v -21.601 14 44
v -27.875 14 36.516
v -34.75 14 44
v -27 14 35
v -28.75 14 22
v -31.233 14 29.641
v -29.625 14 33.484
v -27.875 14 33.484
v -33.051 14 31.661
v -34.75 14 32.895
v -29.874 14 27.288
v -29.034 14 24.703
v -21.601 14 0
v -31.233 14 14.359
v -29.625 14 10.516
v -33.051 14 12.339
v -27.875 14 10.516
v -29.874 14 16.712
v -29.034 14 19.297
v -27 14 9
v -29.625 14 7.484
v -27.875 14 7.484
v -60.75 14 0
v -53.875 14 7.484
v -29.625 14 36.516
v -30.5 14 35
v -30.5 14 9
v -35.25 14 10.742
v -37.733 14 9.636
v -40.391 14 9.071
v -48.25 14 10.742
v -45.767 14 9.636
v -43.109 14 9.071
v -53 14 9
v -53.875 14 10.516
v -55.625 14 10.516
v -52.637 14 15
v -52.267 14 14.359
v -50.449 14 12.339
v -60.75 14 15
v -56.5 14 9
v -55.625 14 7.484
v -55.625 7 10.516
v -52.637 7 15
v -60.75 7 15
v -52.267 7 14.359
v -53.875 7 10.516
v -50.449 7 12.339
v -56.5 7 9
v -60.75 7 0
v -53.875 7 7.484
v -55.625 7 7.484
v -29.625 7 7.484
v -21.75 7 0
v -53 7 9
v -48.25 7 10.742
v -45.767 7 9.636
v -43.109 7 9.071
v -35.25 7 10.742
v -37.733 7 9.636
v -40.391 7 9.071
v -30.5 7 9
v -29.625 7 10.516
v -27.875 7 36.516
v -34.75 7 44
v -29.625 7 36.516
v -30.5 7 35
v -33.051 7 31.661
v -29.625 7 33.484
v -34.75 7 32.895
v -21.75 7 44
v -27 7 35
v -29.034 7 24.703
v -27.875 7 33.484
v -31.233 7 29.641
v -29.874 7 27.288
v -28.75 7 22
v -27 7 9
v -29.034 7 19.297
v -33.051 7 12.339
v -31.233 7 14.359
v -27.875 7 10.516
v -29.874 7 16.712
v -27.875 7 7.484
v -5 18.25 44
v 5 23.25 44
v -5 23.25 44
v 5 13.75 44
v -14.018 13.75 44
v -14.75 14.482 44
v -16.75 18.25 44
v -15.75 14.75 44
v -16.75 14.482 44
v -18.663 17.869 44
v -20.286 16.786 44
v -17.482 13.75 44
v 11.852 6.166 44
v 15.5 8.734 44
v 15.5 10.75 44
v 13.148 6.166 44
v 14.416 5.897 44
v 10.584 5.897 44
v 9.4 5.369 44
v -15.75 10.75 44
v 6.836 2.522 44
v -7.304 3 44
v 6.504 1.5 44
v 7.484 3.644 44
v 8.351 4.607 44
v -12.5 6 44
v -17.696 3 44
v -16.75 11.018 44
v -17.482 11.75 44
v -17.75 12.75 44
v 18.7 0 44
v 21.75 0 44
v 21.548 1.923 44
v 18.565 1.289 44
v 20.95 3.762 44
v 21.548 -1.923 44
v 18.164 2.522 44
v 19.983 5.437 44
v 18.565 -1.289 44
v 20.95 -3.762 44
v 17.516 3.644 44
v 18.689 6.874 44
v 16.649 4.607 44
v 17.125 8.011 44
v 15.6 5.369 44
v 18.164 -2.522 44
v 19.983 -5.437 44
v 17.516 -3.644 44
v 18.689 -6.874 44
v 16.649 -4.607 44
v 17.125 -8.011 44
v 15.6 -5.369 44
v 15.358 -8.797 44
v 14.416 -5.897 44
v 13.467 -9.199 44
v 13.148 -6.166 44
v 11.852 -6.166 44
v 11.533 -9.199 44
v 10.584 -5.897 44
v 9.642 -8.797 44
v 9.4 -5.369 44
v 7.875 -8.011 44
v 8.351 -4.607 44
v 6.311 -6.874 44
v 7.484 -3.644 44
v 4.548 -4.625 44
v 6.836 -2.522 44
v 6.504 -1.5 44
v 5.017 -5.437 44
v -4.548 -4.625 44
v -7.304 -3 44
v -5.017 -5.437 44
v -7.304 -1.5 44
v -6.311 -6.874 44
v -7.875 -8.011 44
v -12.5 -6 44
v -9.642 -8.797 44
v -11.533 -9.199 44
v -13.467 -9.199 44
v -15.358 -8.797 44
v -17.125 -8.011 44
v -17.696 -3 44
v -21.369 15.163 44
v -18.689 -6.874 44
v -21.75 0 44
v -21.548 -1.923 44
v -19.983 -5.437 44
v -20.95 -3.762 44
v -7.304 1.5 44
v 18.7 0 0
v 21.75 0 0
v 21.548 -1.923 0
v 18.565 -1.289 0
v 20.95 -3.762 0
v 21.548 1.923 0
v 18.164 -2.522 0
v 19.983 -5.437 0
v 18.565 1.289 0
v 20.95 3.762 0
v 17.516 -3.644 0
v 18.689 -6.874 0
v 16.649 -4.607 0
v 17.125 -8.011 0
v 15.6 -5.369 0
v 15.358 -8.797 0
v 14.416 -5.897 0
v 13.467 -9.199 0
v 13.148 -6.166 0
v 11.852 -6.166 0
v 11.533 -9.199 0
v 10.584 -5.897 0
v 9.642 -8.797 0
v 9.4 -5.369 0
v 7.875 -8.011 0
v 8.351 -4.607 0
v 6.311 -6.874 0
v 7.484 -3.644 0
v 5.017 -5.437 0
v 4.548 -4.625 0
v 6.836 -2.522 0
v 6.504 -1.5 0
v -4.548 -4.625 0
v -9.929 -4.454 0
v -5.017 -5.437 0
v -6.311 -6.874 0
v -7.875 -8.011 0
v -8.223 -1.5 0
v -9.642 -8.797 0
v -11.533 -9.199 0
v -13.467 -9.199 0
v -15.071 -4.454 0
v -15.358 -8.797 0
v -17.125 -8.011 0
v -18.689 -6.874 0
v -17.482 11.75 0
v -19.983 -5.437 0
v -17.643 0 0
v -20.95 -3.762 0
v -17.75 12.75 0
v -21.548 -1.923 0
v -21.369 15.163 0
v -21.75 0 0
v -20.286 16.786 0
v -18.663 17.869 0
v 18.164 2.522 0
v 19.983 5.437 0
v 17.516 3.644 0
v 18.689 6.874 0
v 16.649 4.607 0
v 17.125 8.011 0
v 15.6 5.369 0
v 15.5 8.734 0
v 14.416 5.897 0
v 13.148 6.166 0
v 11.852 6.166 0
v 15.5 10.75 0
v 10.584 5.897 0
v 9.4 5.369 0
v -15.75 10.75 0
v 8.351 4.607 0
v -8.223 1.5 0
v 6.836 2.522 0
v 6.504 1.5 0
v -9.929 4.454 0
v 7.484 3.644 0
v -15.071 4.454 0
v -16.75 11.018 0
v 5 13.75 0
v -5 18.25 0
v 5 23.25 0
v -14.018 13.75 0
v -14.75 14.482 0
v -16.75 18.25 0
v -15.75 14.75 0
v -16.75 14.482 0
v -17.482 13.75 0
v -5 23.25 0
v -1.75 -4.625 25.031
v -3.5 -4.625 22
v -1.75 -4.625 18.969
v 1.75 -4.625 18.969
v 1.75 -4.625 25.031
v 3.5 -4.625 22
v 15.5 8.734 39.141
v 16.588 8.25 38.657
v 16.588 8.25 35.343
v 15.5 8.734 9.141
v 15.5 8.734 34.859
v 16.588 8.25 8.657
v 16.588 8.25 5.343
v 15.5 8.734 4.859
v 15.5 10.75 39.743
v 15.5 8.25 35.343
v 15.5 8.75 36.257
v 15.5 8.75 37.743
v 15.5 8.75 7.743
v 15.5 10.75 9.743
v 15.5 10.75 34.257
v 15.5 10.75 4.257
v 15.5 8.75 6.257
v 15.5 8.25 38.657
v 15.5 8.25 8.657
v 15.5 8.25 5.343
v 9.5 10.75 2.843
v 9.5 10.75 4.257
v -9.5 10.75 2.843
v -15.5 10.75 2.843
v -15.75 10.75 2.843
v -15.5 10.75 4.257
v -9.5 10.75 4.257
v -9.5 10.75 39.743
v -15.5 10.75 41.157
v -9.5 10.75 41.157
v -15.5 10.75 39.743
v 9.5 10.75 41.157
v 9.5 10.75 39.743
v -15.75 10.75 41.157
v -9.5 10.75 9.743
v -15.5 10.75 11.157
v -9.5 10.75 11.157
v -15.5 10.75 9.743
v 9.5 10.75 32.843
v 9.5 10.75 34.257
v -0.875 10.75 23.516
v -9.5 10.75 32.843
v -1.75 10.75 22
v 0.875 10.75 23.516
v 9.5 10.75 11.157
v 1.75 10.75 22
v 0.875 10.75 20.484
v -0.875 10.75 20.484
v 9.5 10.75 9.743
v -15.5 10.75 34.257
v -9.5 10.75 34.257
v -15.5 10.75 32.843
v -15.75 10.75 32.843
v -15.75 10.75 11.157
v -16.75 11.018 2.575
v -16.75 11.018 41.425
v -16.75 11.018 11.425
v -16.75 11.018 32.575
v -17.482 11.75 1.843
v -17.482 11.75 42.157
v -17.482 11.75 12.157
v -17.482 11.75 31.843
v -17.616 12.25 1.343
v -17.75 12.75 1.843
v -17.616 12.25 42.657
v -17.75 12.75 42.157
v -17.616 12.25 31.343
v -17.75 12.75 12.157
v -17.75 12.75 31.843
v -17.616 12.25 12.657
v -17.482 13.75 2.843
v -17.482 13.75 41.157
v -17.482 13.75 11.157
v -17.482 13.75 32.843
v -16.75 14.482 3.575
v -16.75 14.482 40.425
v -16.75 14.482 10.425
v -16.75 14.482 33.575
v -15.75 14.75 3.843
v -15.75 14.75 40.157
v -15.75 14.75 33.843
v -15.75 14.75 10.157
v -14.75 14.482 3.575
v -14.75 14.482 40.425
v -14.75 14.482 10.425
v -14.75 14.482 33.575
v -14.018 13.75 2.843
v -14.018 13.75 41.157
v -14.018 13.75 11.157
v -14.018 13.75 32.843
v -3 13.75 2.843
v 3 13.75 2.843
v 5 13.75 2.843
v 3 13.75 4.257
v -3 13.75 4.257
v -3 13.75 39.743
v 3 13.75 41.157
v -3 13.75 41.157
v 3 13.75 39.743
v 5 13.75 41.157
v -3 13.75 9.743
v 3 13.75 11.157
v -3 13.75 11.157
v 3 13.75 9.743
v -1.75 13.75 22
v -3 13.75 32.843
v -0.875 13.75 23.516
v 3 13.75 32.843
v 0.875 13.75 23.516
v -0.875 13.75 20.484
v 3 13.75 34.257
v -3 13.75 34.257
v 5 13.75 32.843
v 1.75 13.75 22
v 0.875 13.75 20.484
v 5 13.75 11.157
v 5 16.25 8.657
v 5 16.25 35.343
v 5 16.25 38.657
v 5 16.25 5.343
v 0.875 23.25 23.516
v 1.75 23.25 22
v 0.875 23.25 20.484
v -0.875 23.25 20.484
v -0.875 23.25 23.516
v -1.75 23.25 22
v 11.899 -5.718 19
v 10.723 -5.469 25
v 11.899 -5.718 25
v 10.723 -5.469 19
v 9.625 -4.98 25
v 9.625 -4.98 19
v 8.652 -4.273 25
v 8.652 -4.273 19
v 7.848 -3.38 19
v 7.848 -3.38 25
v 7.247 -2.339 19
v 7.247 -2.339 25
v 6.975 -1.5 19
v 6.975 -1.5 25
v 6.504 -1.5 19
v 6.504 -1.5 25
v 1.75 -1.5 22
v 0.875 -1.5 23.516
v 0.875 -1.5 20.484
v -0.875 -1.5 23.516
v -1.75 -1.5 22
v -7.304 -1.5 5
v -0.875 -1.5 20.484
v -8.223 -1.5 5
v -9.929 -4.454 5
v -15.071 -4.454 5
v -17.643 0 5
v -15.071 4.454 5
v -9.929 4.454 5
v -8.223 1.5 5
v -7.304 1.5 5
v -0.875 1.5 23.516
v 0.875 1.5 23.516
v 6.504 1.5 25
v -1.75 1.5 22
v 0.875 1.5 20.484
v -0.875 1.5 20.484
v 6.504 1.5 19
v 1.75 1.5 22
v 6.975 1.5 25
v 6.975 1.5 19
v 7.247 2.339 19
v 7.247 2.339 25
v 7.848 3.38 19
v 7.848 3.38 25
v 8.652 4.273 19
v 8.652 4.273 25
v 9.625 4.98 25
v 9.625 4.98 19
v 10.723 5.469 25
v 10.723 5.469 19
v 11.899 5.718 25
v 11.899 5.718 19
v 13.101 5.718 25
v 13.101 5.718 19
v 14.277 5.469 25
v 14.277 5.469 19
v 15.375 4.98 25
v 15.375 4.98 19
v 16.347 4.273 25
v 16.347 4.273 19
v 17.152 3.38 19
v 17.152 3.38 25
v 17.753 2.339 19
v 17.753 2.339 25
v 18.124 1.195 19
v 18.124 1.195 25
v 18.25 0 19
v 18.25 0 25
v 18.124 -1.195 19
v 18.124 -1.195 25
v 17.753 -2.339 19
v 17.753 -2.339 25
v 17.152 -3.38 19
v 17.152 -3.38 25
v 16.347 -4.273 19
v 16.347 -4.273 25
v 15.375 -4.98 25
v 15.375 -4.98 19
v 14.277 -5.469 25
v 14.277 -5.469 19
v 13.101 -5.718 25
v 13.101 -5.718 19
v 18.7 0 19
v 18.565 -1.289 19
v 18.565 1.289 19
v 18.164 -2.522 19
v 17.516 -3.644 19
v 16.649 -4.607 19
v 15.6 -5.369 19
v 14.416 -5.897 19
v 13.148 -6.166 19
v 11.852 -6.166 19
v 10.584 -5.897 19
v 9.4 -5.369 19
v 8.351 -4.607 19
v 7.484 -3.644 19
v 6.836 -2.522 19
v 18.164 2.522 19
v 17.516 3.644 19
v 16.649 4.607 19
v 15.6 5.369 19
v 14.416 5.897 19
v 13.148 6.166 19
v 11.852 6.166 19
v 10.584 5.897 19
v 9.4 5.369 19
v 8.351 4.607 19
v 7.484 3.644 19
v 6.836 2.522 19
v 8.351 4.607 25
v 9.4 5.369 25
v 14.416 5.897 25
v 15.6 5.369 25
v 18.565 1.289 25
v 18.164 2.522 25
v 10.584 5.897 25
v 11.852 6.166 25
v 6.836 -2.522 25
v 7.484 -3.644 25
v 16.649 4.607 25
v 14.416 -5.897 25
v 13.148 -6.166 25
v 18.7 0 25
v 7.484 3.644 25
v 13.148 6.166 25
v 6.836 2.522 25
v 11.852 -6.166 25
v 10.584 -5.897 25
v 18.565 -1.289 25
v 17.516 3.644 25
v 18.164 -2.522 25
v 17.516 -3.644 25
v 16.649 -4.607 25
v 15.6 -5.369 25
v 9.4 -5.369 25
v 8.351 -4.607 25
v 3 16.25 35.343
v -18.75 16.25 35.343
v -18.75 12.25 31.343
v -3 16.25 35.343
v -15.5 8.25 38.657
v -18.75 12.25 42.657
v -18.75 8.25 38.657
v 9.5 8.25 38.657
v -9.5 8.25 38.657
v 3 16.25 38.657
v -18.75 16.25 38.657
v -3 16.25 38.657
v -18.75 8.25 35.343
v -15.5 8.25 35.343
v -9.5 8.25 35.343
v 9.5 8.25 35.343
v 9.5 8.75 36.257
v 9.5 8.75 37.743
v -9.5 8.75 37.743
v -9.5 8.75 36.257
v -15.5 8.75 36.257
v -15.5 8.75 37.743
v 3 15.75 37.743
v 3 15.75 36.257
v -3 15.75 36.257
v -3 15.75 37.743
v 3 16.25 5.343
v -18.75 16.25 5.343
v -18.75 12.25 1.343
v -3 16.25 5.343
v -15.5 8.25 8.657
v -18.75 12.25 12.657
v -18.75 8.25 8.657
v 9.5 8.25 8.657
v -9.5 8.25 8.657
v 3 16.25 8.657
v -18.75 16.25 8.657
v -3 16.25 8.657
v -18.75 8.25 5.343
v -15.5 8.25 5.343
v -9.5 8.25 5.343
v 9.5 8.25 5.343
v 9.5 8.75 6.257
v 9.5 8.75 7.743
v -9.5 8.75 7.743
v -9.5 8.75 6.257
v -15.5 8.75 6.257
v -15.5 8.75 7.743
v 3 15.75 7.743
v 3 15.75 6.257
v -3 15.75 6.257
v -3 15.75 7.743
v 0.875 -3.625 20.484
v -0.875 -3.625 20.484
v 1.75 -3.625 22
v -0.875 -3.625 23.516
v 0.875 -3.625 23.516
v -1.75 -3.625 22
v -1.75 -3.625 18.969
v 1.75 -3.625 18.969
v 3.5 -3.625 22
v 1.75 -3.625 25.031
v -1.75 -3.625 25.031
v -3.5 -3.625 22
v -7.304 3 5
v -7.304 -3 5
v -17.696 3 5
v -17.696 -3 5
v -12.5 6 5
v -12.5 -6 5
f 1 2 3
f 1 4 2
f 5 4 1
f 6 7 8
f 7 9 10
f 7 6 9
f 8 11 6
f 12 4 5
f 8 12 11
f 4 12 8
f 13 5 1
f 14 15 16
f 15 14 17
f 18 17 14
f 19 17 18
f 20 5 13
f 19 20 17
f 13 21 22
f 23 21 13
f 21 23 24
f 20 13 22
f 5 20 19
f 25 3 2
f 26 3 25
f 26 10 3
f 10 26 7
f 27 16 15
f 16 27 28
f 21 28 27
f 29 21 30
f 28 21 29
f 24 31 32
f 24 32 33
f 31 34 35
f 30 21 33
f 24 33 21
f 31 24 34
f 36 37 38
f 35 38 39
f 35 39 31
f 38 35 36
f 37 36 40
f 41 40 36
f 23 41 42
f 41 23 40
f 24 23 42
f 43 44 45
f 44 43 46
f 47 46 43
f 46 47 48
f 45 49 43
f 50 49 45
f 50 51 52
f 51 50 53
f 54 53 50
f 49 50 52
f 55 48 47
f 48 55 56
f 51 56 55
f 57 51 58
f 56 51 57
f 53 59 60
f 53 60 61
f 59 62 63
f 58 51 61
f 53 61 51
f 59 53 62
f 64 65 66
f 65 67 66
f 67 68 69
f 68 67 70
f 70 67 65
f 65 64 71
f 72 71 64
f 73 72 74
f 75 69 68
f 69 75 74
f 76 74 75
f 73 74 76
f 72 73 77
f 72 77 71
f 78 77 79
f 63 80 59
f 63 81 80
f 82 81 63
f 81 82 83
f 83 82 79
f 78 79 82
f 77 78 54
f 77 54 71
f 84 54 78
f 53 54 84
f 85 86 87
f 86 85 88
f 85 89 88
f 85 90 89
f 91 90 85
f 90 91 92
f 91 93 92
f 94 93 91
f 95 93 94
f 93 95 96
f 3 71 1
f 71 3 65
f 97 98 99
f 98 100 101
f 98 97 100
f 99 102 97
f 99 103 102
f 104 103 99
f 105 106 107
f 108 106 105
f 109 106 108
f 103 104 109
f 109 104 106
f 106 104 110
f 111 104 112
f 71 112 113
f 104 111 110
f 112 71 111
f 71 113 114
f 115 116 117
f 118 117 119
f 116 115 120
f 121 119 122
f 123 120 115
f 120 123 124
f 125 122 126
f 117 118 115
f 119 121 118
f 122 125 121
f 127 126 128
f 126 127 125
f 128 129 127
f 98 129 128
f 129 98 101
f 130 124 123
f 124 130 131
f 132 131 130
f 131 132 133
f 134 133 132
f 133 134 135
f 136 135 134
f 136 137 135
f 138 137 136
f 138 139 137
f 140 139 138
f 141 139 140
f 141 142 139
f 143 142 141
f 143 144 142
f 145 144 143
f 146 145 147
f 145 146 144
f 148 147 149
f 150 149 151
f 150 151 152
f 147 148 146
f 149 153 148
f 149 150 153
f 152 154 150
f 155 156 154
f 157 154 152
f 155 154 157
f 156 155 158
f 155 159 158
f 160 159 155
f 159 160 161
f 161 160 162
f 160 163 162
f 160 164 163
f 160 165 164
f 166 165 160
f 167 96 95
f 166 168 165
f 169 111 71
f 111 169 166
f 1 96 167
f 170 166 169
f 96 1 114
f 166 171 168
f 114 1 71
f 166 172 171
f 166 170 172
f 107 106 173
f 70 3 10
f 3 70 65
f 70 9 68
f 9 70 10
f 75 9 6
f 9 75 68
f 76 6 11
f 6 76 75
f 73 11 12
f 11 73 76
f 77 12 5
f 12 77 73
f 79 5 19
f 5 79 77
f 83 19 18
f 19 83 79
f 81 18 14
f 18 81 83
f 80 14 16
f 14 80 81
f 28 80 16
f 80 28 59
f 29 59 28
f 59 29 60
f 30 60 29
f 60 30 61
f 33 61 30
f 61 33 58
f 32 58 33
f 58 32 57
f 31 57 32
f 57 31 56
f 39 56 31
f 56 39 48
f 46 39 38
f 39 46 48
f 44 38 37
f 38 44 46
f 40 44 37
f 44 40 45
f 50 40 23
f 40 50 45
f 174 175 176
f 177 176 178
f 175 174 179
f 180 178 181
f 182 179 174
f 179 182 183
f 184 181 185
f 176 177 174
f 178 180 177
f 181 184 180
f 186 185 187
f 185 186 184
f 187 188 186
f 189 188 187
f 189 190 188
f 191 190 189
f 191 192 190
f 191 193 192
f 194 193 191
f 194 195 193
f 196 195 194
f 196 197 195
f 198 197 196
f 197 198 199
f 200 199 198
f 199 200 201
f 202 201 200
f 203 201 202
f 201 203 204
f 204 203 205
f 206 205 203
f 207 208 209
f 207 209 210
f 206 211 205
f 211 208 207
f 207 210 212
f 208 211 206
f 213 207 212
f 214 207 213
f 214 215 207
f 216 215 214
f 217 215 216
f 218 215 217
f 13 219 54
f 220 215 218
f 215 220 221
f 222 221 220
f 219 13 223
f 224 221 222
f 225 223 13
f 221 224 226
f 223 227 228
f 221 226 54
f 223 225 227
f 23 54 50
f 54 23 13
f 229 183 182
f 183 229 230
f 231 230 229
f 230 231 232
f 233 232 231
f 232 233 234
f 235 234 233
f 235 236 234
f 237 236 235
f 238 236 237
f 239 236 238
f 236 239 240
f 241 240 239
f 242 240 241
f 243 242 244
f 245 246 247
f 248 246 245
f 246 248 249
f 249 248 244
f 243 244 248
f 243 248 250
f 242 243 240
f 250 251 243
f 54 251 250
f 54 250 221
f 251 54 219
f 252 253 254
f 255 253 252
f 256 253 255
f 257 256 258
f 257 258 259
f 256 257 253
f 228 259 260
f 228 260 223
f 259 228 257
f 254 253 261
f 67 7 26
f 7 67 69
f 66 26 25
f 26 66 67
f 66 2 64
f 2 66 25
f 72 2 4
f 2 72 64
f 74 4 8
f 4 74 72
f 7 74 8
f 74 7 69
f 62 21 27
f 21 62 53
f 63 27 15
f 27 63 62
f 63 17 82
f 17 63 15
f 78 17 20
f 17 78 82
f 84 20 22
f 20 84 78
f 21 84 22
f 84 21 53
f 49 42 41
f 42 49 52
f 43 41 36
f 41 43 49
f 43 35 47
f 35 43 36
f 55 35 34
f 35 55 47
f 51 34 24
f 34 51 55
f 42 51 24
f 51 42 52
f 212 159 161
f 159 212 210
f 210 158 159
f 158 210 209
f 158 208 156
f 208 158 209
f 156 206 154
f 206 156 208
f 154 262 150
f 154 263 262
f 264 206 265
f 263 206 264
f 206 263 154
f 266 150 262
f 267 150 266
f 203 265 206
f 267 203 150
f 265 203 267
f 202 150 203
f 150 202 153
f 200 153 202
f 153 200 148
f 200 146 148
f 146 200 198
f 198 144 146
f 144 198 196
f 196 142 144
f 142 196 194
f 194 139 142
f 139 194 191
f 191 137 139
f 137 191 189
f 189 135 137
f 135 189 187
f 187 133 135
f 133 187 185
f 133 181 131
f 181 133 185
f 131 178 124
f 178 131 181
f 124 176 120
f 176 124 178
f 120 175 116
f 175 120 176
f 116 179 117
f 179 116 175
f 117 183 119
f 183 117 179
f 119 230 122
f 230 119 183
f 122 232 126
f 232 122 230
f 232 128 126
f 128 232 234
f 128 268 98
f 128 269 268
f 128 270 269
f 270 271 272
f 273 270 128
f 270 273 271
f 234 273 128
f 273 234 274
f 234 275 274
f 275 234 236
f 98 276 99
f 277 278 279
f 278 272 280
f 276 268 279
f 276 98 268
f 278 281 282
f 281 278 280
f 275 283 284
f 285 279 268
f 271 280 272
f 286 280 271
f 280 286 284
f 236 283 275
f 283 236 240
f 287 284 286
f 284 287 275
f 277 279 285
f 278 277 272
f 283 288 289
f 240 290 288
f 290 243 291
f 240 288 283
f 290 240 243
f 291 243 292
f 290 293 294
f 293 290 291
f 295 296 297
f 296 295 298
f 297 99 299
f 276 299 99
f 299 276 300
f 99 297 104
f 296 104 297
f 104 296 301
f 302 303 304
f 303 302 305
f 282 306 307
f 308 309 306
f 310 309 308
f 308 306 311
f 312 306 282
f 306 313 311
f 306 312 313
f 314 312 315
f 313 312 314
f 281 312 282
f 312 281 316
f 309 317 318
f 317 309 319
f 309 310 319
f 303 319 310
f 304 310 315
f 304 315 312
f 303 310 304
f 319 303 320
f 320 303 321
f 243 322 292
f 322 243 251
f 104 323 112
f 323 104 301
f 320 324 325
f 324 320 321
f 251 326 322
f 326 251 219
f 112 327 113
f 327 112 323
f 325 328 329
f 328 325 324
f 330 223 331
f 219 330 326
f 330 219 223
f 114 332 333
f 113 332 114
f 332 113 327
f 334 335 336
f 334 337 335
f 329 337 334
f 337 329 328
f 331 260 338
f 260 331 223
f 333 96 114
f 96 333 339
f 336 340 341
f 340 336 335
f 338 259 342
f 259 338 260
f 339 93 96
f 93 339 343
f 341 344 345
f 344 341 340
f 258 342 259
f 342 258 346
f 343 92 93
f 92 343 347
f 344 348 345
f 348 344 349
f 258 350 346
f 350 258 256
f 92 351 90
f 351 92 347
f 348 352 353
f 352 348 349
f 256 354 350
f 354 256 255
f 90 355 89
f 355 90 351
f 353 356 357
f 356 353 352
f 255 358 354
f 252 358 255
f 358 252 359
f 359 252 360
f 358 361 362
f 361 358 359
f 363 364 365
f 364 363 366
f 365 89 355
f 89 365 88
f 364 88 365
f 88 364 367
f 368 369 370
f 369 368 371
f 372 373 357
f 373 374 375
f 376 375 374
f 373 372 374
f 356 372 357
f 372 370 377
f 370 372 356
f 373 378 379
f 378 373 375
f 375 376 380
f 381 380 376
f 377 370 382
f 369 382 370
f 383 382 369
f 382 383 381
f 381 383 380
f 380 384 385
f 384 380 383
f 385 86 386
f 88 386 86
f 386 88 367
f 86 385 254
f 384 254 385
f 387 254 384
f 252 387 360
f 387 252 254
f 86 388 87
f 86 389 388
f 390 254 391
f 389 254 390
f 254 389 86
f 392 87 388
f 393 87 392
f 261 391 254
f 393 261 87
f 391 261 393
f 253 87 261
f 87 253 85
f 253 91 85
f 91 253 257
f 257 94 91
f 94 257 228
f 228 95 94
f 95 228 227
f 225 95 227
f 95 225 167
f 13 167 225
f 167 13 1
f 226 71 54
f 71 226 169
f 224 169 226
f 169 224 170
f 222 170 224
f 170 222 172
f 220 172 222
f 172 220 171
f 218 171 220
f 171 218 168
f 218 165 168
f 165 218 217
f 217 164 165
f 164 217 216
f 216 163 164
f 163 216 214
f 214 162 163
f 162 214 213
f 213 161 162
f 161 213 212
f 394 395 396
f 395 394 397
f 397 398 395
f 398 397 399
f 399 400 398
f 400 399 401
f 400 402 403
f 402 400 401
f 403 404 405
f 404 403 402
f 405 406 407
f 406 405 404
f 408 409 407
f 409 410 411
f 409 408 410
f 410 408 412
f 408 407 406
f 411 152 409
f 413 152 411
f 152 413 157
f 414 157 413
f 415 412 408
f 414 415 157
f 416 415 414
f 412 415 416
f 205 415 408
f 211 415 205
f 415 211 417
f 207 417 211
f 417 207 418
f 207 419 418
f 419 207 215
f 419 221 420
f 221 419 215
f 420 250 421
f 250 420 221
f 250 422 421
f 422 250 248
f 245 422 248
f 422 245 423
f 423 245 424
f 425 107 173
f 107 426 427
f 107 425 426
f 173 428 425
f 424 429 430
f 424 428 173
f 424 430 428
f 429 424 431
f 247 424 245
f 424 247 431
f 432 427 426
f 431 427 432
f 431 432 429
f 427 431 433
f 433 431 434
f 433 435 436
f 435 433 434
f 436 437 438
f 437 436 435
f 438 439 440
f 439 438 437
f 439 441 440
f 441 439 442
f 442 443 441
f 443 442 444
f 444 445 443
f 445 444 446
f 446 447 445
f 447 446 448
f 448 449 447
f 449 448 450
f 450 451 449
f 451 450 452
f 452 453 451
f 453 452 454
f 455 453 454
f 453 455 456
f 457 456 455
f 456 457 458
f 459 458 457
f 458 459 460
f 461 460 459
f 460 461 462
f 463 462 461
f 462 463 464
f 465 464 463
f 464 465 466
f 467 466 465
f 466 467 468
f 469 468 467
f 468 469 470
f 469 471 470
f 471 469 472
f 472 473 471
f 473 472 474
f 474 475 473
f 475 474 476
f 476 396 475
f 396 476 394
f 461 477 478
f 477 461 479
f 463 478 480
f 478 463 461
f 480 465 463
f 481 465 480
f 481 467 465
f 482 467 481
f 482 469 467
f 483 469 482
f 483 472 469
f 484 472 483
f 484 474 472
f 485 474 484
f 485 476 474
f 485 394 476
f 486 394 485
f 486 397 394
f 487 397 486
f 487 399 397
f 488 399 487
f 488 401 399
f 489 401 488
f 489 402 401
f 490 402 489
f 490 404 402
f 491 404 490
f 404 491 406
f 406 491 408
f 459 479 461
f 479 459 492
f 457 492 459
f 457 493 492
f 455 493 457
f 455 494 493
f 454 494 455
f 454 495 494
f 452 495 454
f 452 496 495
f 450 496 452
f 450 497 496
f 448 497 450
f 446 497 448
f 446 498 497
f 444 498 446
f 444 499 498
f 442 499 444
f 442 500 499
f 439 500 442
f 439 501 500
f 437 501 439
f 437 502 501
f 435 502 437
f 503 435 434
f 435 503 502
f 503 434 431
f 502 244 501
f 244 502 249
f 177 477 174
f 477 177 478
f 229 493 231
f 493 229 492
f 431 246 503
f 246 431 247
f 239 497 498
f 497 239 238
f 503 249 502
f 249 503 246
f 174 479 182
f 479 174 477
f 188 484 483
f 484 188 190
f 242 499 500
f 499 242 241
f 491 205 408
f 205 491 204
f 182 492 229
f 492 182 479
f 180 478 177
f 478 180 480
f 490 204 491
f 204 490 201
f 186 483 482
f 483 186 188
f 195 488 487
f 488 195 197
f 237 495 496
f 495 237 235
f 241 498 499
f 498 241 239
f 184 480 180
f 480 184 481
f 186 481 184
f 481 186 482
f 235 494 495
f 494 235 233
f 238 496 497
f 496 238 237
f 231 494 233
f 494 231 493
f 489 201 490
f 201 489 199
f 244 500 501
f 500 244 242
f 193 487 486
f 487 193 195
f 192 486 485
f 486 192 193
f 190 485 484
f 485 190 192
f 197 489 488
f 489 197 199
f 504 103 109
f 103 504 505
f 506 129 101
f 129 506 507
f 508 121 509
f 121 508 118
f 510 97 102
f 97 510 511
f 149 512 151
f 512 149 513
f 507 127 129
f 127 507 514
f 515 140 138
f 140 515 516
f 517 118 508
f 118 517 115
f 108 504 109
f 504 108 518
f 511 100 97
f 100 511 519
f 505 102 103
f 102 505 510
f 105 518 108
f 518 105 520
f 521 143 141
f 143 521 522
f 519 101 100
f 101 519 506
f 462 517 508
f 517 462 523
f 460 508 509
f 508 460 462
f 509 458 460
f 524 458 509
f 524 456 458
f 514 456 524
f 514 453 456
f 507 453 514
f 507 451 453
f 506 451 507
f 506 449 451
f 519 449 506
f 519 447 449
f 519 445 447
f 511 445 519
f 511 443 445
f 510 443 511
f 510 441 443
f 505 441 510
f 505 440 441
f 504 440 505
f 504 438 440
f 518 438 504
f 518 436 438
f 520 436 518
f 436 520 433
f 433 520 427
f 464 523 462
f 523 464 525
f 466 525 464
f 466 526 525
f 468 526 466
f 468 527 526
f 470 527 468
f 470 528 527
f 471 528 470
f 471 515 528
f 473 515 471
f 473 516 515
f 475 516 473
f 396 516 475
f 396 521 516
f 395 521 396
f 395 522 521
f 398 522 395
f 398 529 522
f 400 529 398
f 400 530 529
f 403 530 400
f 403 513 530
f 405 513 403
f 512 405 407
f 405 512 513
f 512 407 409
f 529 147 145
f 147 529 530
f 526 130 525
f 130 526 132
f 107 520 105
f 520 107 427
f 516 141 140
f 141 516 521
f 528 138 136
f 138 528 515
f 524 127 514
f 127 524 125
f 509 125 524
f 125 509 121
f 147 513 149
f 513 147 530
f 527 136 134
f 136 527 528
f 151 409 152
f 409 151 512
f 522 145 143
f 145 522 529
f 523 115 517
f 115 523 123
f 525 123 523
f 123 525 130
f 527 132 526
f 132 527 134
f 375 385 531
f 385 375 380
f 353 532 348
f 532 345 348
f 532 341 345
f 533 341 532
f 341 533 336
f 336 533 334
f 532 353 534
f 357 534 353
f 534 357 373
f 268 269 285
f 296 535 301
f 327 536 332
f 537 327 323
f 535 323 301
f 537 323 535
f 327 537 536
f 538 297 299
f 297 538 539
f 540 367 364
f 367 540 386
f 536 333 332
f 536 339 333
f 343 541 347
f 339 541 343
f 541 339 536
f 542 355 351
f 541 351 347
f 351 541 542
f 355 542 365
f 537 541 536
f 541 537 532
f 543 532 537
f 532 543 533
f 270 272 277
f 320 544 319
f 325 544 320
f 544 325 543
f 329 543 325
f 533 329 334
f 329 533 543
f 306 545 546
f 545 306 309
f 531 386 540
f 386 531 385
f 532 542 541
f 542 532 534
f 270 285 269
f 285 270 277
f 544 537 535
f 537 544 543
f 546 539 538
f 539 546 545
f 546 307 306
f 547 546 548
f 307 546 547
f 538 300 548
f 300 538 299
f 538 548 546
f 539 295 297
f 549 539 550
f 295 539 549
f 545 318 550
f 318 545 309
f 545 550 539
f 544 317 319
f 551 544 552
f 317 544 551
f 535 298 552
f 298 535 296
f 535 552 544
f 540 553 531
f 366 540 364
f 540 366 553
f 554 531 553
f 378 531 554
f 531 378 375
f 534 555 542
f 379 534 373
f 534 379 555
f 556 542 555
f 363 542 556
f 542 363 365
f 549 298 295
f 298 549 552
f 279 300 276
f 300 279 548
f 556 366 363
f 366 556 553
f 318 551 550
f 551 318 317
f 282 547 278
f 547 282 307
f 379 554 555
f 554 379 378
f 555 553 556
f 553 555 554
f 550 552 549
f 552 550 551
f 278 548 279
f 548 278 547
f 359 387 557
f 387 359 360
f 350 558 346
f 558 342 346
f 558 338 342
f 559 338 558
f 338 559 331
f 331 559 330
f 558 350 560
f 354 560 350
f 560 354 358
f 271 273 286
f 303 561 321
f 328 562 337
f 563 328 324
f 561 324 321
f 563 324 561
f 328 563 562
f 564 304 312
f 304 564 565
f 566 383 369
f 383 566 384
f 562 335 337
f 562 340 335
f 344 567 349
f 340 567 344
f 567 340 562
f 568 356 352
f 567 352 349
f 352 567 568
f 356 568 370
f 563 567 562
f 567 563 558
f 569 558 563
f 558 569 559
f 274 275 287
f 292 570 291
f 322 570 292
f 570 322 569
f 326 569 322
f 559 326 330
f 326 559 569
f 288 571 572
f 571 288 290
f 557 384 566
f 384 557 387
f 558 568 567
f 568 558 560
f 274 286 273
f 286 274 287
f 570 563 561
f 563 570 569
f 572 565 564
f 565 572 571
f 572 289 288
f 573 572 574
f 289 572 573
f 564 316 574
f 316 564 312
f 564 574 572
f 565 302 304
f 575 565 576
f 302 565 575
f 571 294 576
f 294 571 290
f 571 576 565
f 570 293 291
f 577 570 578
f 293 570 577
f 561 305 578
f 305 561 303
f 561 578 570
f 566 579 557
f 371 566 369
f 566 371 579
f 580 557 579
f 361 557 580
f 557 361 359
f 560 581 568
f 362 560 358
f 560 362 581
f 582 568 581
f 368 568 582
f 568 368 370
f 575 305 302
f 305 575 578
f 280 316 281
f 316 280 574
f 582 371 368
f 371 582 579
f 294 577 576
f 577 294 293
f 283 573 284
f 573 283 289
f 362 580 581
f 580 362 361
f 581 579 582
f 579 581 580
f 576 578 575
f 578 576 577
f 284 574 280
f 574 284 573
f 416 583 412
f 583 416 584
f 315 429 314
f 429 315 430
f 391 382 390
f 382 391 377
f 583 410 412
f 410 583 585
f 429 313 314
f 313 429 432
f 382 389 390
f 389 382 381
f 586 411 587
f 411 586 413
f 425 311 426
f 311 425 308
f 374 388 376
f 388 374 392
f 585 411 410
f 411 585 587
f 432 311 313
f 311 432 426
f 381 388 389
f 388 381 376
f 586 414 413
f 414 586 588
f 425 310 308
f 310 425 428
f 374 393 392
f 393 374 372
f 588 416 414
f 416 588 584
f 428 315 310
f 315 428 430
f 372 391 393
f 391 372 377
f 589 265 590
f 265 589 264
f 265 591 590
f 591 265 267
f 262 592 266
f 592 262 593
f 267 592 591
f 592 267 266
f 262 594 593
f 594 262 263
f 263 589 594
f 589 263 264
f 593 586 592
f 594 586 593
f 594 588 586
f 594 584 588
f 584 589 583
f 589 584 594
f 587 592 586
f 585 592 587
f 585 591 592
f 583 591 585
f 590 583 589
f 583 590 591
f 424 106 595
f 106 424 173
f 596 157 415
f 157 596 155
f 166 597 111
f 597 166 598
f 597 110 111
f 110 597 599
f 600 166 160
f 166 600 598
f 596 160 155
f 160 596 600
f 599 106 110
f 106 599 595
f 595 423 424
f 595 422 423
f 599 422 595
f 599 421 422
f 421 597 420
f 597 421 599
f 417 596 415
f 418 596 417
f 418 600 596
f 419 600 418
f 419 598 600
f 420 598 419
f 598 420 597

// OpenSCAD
// file: configuration.scad
// default configuration
// m6 rods and nema14 motors

rod_size = 6;
rod_nut_size = 12; //12 for M6, 16 for M8
bearing_size = 12.5; //12 for LM6UU, 15 for LM8UU,LM8SUU
bearing_length = 20; //19 for LM6UU, 17 for LM8SUU, 24 for LM8UU
yz_motor_distance = 25;
motor_screw_spacing = 26; //26 for NEMA14, 31 for NEMA17
motor_casing = 38; //38 for NEMA14, 45 for NEMA17
end_height = 40;
bed_mount_height = 16;
//x_rod_spacing = motor_screw_spacing + 3 + rod_size;
x_rod_spacing = 30;
x_carriage_width = 70;
carriage_extruder_offset = 5;
pulley_size = 20;
idler_pulley_width = 10;
gusset_size = 15;
// main file
//x end modules

include <configuration.scad>



module x_end(motor = 0) mirror([(motor == 0) ? 1 : 0, 0, 0]) difference() {
	union() {
		if(motor > 0) translate([-(motor_casing / 2 + rod_size + bearing_size + 8) / 2 - motor_casing, 8 + rod_size, 0]) rotate([90, 0, 0]) {
			linear_extrude(height = 7) difference() {
				square([motor_casing + 3, x_rod_spacing + 8 + rod_size]);
				translate([motor_casing / 2, (x_rod_spacing + 8 + rod_size) / 2, 0]) {
					circle(motor_screw_spacing / 2);
					for(x = [1, -1]) for(y = [1, -1]) translate([x * motor_screw_spacing / 2, y * motor_screw_spacing / 2, 0]) circle(3 * 7/12, $fn = 6);
					translate([-(motor_casing * 1.5 - motor_screw_spacing), (motor > 1) ? (motor_casing /2 - motor_screw_spacing) : 0, 0]) square([motor_casing, x_rod_spacing + 8 + rod_size]);
				}
			}
			%translate([motor_casing / 2, (x_rod_spacing + 8 + rod_size) / 2, rod_size / 2 - 2 - bearing_size / 2 - 2 - idler_pulley_width / 2]) rotate([180, 0, 0]) linear_extrude(height = 5, convexity = 5) difference() {
				union() {
					circle(pulley_size / 2 + 2);
					translate([0, -pulley_size / 2 - 2, 0]) square([200.5, pulley_size + 4]);
					translate([200.5, 0, 0]) circle(pulley_size / 2 + 2);
				}
				circle(pulley_size / 2);
				translate([0, -pulley_size / 2, 0]) square([200.5, pulley_size]);
				translate([200.5, 0, 0]) circle(pulley_size/2);
			}

		}
		linear_extrude(height = x_rod_spacing + 8 + rod_size, convexity = 5) difference() {
			union() {
				for(side = [1, -1]) translate([side * (motor_casing / 4 + rod_size / 2), 0, 0]) circle(bearing_size / 2 + 3, $fn = 30);
				square([motor_casing / 2 + rod_size, bearing_size / 2 + 3], center = true);
				translate([-(motor_casing / 2 + rod_size + bearing_size + 6) / 2, 0, 0]) square([(motor_casing / 2 + rod_size + bearing_size / 2 + 3 + 3) / 2, bearing_size / 2 + 4 + rod_size / 2]);
				translate([-(motor_casing / 2 + rod_size + bearing_size + 6) / 2, 0, 0]) square([motor_casing / 2 + rod_size + bearing_size / 2 + 3 + 3, bearing_size / 2 + 3 + rod_size / 2]);
				translate([-(motor_casing / 2 + rod_size + bearing_size + 6) / 2 + rod_size / 2 + 2, 0, 0]) square([(motor_casing / 2 + rod_size + bearing_size + 6) / 2 + 5 - rod_size / 2 - 2, bearing_size / 2 + 6 + rod_size]);
				translate([-(motor_casing / 2 + rod_size + bearing_size + 6) / 2 + rod_size / 2 + 2, bearing_size / 2 + rod_size / 2 + 4, 0]) circle(rod_size / 2 + 2);
				translate([0, bearing_size / 2 + rod_size + 6, 0]) square(10, center = true);
			}
			square([motor_casing / 2 + rod_size, 3], center = true);
			translate([(motor_casing / 4 + rod_size / 2), 0, 0]) circle(bearing_size / 2 - .5, $fn = 30);
			translate([-(motor_casing / 4 + rod_size / 2), 0, 0]) circle(rod_nut_size * 6/14, $fn = 6);
			translate([4 + rod_size / 2, bearing_size / 2 + rod_size / 2 + 3, 0]) {
				square([motor_casing / 2 + rod_size + bearing_size + 8, rod_size / 2], center = true);
				translate([-(motor_casing / 2 + rod_size + bearing_size + 8) / 2, .5, 0]) circle(rod_size / 4 + .5, $fn = 12);
			}
		}
	}
	translate([0, 0, (x_rod_spacing + rod_size + 8) / 2]) {
		for(end = [0, 1]) mirror([0, 0, end]) translate([motor_casing / 4 + rod_size / 2, 0, -(x_rod_spacing + rod_size + 8) / 2 - 1]) cylinder(r = bearing_size / 2 - .05, h = bearing_length, $fn = 30);
		for(side = [1, -1]) render(convexity = 5) translate([0, bearing_size / 2 + rod_size / 2 + 3, side * x_rod_spacing / 2]) rotate([0, 90, 0]) {
			//cylinder(r = rod_size / 2, h = motor_casing / 2 + rod_size + bearing_size + 10, center = true, $fn = 30);
			difference() {
				translate([0, 0, (motor > -1) ? rod_size / 2 + 2 : 0]) intersection() {
					rotate(45) cube([rod_size + 2, rod_size + 2, motor_casing / 2 + rod_size + bearing_size + 10], center = true);
					cube([rod_size * 2, rod_size + 2, motor_casing / 2 + rod_size + bearing_size + 10], center = true);
				}
				translate([0, rod_size, 0]) cube([rod_size * 2, rod_size * 2, 6], center = true);
				for(end = [1, -1]) translate([0, -rod_size, end * (motor_casing / 4 + rod_size / 2)]) cube([rod_size * 2, rod_size * 2, 6], center = true);
			}
			translate([0, 0, rod_size / 2 + 2]) intersection() {
				rotate(45) cube([rod_size, rod_size, motor_casing / 2 + rod_size + bearing_size + 10], center = true);
				cube([rod_size * 2, rod_size + 1, motor_casing / 2 + rod_size + bearing_size + 10], center = true);
			}
		}
		rotate([90, 0, 0]) {
			cylinder(r = 3 * 7/12, h = 100, center = true, $fn = 6);
			translate([0, 0, bearing_size / 4 + .5]) cylinder(r = 3 * 7/6, h = 100, center = false, $fn = 6);
		}
	}
	translate([-(motor_casing / 4 + rod_size / 2), 0, 5]) rotate(90) cylinder(r = rod_nut_size / 2, h = x_rod_spacing + 8 + rod_size, $fn = 6);
	translate([(motor_casing / 4 + rod_size / 2), 0, 5]) %rotate(180 / 8) cylinder(r = rod_size * 13/24, h = 200, center = true, $fn = 8);
}

x_end(2);
//!x_end(0);
